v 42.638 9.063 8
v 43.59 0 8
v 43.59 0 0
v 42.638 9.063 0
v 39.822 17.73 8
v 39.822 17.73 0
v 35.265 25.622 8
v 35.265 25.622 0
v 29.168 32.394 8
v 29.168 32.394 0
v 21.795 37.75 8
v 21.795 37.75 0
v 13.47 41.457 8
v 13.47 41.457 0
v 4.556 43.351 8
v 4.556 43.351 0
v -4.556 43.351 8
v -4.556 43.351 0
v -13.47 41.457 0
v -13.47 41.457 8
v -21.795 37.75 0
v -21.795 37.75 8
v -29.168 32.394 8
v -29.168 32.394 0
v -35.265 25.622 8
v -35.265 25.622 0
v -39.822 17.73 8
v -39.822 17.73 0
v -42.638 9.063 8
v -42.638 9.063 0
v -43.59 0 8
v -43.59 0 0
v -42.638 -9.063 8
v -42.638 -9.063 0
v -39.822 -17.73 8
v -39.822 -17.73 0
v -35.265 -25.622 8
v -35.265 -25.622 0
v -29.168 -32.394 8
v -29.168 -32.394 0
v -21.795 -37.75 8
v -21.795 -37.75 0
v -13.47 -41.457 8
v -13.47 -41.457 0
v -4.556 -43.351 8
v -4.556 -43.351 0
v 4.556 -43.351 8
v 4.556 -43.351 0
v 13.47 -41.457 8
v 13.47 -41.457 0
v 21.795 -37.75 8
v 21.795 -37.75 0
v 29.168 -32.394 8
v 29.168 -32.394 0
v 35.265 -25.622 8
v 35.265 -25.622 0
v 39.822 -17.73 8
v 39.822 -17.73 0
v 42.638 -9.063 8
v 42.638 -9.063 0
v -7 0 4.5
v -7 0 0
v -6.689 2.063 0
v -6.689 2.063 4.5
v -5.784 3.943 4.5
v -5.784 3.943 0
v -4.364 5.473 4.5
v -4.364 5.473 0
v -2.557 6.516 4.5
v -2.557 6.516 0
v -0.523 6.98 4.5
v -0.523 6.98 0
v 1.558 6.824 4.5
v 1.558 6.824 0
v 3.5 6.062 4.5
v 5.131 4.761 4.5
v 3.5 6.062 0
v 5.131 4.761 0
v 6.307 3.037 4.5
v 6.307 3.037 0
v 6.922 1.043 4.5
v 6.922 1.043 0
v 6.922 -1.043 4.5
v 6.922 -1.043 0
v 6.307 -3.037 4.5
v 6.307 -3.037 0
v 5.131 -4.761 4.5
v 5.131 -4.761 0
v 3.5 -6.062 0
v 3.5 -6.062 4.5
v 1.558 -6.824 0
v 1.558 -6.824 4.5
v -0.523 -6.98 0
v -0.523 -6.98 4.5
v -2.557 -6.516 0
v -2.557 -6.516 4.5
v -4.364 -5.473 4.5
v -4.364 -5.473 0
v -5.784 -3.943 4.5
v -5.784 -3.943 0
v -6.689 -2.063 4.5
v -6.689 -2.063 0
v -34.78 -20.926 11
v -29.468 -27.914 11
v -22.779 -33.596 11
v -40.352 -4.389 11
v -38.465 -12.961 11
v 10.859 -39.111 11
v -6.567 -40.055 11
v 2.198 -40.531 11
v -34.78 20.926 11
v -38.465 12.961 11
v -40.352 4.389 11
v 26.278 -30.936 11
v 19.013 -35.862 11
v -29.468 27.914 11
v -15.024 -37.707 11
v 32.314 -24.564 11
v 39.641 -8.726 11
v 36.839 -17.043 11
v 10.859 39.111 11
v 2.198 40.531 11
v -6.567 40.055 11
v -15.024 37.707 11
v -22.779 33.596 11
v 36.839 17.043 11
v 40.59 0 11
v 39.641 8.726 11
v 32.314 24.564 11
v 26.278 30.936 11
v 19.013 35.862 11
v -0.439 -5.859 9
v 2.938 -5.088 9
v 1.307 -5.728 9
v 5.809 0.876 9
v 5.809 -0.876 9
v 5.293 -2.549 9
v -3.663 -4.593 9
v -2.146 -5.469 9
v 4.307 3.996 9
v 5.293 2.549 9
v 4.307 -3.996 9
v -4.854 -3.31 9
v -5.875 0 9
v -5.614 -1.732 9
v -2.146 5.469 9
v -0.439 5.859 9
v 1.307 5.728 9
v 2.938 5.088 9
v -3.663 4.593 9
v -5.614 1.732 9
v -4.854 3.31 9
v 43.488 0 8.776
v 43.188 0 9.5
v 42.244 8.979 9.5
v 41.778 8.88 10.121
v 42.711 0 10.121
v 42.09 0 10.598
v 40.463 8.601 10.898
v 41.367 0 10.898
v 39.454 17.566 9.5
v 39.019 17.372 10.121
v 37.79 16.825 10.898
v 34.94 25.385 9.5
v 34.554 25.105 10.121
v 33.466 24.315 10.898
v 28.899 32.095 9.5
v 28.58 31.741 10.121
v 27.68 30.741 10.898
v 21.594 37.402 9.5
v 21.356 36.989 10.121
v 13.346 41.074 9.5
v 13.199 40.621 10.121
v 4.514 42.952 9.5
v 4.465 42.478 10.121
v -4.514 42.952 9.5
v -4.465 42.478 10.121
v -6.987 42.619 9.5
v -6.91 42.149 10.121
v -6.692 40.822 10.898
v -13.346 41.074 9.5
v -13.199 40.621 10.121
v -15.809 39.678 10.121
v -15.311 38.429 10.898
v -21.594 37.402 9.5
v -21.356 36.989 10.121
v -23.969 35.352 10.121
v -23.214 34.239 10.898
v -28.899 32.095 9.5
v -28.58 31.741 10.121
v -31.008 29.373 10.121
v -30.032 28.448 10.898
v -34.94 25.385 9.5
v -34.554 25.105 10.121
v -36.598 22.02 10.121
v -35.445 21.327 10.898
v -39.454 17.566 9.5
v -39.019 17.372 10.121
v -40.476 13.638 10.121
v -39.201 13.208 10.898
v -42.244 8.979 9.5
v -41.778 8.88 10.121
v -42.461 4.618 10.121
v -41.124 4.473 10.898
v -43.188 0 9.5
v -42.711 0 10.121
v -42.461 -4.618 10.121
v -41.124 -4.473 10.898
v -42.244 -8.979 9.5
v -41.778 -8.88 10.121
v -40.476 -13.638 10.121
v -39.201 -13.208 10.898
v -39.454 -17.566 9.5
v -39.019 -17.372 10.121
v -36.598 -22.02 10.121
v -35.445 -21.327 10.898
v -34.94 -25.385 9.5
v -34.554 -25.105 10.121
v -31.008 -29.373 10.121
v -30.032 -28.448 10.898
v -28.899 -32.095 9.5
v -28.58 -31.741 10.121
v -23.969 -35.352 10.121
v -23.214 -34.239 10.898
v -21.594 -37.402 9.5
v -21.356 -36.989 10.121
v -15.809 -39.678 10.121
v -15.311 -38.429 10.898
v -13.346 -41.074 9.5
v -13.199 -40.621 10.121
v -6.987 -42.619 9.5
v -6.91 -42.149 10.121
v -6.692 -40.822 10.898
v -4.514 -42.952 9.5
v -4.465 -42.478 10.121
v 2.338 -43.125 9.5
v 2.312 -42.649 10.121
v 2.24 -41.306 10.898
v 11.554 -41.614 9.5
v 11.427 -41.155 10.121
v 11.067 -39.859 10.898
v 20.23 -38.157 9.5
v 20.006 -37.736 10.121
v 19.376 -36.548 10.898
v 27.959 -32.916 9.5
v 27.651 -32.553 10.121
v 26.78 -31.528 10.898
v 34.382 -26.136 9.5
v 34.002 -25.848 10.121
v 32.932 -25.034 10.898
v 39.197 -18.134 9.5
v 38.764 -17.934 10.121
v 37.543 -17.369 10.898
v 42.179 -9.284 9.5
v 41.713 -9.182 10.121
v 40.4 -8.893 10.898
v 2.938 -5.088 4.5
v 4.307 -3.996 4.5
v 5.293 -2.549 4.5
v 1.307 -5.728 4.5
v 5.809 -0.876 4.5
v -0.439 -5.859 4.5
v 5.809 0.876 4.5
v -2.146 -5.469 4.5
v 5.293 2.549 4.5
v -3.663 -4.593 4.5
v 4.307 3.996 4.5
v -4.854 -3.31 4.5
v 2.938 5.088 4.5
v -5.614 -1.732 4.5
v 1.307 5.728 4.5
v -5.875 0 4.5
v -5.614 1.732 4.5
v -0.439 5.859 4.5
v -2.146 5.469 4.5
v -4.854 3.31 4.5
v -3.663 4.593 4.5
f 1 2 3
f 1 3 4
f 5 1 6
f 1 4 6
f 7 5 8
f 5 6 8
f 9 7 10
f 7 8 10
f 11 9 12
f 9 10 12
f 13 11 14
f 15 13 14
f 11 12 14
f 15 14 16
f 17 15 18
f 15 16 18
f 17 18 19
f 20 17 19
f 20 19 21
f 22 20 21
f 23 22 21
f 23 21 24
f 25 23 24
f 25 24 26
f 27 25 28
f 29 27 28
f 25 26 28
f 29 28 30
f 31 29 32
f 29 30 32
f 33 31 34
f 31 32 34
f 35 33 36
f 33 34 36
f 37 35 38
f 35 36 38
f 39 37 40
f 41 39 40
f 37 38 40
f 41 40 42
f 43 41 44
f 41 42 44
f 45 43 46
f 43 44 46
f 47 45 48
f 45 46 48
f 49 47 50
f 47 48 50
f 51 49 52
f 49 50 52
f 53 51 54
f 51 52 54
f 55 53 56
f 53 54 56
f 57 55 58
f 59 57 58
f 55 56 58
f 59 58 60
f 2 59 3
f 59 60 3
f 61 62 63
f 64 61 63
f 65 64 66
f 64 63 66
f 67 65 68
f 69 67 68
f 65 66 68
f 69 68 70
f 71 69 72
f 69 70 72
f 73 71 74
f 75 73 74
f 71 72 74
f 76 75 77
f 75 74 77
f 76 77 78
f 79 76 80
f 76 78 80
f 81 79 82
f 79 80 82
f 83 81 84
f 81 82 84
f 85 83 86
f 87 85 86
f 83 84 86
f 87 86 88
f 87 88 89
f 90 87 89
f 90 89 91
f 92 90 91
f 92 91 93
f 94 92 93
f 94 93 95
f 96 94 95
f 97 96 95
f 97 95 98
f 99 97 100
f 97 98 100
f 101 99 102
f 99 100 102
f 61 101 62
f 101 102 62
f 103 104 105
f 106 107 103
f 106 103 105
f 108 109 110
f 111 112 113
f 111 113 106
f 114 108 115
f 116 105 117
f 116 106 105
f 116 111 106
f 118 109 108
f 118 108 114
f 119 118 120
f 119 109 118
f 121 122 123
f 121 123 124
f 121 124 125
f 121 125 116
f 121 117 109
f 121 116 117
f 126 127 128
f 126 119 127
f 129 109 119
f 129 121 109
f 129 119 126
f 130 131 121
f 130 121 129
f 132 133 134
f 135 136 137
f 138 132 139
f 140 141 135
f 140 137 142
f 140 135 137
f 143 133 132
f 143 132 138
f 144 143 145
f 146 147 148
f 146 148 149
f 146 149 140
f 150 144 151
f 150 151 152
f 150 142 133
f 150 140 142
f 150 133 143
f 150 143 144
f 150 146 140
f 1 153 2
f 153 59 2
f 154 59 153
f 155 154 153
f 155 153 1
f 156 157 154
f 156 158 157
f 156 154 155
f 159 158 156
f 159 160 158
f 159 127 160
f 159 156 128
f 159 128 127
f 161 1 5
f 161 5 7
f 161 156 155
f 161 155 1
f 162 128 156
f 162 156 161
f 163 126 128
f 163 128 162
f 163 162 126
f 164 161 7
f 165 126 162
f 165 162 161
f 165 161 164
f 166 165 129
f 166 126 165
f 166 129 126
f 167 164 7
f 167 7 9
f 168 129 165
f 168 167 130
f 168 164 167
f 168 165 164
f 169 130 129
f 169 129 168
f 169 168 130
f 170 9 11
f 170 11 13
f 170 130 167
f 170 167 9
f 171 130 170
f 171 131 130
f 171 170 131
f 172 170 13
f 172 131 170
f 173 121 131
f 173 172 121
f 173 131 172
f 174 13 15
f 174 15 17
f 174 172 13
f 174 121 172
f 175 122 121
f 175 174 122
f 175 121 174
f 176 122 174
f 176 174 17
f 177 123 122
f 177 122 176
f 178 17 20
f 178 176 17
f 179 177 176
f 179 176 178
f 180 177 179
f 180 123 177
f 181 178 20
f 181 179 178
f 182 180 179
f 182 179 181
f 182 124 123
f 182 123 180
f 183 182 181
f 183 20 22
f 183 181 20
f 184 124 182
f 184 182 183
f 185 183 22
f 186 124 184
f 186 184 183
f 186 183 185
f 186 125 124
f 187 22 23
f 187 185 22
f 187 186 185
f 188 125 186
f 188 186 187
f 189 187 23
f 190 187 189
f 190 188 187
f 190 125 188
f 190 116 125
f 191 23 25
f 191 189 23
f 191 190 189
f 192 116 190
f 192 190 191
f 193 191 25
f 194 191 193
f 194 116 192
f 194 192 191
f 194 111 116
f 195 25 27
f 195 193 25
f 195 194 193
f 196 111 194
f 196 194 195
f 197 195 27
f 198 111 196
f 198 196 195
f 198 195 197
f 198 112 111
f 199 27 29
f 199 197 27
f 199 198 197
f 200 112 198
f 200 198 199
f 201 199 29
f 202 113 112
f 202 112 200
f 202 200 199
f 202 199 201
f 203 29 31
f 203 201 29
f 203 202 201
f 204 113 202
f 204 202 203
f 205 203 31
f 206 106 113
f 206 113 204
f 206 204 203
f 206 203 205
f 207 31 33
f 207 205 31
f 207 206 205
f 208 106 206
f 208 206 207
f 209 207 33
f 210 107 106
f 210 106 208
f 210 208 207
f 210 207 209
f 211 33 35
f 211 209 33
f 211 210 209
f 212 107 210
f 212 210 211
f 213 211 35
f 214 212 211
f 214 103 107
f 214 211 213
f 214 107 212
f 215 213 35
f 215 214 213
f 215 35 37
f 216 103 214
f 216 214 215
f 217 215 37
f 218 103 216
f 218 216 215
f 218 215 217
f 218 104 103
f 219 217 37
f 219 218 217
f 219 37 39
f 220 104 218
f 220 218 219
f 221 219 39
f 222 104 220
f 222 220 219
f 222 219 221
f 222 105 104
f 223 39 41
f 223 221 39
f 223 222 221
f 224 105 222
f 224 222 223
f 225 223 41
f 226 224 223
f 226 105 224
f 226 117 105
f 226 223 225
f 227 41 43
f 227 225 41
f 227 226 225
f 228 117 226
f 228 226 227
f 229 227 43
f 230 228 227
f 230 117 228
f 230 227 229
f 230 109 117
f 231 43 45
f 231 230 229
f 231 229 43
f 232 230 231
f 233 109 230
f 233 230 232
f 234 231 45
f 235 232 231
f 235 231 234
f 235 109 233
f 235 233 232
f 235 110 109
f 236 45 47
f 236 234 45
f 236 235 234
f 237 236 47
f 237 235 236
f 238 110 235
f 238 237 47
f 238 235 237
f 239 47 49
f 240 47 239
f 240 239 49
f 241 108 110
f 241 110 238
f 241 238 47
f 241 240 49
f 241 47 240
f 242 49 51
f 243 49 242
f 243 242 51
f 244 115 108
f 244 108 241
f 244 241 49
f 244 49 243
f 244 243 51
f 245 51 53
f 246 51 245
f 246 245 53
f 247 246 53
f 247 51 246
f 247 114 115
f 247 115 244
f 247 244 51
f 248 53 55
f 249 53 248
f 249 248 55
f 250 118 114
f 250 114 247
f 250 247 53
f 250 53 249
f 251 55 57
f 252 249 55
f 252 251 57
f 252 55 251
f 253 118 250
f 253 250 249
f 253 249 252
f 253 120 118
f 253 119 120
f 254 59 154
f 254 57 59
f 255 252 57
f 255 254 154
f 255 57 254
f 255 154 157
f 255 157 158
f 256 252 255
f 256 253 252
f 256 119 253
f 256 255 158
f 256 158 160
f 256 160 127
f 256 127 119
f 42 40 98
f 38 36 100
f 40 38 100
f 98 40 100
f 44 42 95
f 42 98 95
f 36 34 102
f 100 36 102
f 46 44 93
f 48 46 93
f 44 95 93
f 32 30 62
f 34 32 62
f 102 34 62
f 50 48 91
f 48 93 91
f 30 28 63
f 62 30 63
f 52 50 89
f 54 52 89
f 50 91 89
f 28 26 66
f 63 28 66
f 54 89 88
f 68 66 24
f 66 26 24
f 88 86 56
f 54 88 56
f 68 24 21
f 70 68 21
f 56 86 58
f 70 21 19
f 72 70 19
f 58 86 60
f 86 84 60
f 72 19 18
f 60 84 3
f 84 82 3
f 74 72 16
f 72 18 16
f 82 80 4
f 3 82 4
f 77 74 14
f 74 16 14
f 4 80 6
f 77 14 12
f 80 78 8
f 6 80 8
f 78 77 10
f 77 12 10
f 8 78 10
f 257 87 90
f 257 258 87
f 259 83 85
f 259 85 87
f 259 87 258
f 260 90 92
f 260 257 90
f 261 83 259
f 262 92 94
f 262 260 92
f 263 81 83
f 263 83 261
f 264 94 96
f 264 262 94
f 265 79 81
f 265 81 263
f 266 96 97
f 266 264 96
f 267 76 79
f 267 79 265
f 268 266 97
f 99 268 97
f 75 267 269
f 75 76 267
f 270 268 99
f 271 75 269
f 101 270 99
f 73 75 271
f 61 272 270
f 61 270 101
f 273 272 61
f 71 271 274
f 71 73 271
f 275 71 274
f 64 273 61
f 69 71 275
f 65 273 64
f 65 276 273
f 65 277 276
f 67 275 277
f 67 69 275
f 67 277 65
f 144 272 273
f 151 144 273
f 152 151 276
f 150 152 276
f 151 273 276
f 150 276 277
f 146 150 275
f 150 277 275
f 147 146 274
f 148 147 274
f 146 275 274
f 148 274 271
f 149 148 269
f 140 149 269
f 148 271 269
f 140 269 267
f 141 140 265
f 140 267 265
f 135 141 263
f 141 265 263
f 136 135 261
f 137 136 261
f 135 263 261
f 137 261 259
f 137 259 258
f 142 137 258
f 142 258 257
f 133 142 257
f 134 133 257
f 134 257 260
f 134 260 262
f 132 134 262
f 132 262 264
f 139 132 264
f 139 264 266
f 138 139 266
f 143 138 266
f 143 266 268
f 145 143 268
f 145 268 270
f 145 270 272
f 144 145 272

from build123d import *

# Parameters (mm, degrees)
CROQUIS1_R              = 43.5901732
SALIENTE_EXTRUIR1_DEPTH = 11
REDONDEO1_R             = 3
CROQUIS2_R              = 5.875
CORTAR_EXTRUIR1_DEPTH   = 9
CROQUIS3_R              = 7
CORTAR_EXTRUIR2_DEPTH   = 4.5


with BuildPart() as part:
    # Croquis1 → Saliente-Extruir1 (new body)
    with BuildSketch(Plane.XY):
        Circle(CROQUIS1_R)
    extrude(amount=SALIENTE_EXTRUIR1_DEPTH)

    # Redondeo1
    redondeo1_edges = [part.edges().sort_by_distance(p)[0] for p in [
        (-43.5901732, 0, 11),
    ]]
    fillet(redondeo1_edges, radius=REDONDEO1_R)

    # Croquis2 → Cortar-Extruir1 (cut)
    with BuildSketch(Plane(origin=(0, 0, 0), x_dir=(-1, 0, 0), z_dir=(0, 0, -1))):
        Circle(CROQUIS2_R)
    extrude(amount=-CORTAR_EXTRUIR1_DEPTH, mode=Mode.SUBTRACT)

    # Croquis3 → Cortar-Extruir2 (cut)
    with BuildSketch(Plane(origin=(0, 0, 0), x_dir=(-1, 0, 0), z_dir=(0, 0, -1))):
        Circle(CROQUIS3_R)
    extrude(amount=-CORTAR_EXTRUIR2_DEPTH, mode=Mode.SUBTRACT)


solid = part.part
